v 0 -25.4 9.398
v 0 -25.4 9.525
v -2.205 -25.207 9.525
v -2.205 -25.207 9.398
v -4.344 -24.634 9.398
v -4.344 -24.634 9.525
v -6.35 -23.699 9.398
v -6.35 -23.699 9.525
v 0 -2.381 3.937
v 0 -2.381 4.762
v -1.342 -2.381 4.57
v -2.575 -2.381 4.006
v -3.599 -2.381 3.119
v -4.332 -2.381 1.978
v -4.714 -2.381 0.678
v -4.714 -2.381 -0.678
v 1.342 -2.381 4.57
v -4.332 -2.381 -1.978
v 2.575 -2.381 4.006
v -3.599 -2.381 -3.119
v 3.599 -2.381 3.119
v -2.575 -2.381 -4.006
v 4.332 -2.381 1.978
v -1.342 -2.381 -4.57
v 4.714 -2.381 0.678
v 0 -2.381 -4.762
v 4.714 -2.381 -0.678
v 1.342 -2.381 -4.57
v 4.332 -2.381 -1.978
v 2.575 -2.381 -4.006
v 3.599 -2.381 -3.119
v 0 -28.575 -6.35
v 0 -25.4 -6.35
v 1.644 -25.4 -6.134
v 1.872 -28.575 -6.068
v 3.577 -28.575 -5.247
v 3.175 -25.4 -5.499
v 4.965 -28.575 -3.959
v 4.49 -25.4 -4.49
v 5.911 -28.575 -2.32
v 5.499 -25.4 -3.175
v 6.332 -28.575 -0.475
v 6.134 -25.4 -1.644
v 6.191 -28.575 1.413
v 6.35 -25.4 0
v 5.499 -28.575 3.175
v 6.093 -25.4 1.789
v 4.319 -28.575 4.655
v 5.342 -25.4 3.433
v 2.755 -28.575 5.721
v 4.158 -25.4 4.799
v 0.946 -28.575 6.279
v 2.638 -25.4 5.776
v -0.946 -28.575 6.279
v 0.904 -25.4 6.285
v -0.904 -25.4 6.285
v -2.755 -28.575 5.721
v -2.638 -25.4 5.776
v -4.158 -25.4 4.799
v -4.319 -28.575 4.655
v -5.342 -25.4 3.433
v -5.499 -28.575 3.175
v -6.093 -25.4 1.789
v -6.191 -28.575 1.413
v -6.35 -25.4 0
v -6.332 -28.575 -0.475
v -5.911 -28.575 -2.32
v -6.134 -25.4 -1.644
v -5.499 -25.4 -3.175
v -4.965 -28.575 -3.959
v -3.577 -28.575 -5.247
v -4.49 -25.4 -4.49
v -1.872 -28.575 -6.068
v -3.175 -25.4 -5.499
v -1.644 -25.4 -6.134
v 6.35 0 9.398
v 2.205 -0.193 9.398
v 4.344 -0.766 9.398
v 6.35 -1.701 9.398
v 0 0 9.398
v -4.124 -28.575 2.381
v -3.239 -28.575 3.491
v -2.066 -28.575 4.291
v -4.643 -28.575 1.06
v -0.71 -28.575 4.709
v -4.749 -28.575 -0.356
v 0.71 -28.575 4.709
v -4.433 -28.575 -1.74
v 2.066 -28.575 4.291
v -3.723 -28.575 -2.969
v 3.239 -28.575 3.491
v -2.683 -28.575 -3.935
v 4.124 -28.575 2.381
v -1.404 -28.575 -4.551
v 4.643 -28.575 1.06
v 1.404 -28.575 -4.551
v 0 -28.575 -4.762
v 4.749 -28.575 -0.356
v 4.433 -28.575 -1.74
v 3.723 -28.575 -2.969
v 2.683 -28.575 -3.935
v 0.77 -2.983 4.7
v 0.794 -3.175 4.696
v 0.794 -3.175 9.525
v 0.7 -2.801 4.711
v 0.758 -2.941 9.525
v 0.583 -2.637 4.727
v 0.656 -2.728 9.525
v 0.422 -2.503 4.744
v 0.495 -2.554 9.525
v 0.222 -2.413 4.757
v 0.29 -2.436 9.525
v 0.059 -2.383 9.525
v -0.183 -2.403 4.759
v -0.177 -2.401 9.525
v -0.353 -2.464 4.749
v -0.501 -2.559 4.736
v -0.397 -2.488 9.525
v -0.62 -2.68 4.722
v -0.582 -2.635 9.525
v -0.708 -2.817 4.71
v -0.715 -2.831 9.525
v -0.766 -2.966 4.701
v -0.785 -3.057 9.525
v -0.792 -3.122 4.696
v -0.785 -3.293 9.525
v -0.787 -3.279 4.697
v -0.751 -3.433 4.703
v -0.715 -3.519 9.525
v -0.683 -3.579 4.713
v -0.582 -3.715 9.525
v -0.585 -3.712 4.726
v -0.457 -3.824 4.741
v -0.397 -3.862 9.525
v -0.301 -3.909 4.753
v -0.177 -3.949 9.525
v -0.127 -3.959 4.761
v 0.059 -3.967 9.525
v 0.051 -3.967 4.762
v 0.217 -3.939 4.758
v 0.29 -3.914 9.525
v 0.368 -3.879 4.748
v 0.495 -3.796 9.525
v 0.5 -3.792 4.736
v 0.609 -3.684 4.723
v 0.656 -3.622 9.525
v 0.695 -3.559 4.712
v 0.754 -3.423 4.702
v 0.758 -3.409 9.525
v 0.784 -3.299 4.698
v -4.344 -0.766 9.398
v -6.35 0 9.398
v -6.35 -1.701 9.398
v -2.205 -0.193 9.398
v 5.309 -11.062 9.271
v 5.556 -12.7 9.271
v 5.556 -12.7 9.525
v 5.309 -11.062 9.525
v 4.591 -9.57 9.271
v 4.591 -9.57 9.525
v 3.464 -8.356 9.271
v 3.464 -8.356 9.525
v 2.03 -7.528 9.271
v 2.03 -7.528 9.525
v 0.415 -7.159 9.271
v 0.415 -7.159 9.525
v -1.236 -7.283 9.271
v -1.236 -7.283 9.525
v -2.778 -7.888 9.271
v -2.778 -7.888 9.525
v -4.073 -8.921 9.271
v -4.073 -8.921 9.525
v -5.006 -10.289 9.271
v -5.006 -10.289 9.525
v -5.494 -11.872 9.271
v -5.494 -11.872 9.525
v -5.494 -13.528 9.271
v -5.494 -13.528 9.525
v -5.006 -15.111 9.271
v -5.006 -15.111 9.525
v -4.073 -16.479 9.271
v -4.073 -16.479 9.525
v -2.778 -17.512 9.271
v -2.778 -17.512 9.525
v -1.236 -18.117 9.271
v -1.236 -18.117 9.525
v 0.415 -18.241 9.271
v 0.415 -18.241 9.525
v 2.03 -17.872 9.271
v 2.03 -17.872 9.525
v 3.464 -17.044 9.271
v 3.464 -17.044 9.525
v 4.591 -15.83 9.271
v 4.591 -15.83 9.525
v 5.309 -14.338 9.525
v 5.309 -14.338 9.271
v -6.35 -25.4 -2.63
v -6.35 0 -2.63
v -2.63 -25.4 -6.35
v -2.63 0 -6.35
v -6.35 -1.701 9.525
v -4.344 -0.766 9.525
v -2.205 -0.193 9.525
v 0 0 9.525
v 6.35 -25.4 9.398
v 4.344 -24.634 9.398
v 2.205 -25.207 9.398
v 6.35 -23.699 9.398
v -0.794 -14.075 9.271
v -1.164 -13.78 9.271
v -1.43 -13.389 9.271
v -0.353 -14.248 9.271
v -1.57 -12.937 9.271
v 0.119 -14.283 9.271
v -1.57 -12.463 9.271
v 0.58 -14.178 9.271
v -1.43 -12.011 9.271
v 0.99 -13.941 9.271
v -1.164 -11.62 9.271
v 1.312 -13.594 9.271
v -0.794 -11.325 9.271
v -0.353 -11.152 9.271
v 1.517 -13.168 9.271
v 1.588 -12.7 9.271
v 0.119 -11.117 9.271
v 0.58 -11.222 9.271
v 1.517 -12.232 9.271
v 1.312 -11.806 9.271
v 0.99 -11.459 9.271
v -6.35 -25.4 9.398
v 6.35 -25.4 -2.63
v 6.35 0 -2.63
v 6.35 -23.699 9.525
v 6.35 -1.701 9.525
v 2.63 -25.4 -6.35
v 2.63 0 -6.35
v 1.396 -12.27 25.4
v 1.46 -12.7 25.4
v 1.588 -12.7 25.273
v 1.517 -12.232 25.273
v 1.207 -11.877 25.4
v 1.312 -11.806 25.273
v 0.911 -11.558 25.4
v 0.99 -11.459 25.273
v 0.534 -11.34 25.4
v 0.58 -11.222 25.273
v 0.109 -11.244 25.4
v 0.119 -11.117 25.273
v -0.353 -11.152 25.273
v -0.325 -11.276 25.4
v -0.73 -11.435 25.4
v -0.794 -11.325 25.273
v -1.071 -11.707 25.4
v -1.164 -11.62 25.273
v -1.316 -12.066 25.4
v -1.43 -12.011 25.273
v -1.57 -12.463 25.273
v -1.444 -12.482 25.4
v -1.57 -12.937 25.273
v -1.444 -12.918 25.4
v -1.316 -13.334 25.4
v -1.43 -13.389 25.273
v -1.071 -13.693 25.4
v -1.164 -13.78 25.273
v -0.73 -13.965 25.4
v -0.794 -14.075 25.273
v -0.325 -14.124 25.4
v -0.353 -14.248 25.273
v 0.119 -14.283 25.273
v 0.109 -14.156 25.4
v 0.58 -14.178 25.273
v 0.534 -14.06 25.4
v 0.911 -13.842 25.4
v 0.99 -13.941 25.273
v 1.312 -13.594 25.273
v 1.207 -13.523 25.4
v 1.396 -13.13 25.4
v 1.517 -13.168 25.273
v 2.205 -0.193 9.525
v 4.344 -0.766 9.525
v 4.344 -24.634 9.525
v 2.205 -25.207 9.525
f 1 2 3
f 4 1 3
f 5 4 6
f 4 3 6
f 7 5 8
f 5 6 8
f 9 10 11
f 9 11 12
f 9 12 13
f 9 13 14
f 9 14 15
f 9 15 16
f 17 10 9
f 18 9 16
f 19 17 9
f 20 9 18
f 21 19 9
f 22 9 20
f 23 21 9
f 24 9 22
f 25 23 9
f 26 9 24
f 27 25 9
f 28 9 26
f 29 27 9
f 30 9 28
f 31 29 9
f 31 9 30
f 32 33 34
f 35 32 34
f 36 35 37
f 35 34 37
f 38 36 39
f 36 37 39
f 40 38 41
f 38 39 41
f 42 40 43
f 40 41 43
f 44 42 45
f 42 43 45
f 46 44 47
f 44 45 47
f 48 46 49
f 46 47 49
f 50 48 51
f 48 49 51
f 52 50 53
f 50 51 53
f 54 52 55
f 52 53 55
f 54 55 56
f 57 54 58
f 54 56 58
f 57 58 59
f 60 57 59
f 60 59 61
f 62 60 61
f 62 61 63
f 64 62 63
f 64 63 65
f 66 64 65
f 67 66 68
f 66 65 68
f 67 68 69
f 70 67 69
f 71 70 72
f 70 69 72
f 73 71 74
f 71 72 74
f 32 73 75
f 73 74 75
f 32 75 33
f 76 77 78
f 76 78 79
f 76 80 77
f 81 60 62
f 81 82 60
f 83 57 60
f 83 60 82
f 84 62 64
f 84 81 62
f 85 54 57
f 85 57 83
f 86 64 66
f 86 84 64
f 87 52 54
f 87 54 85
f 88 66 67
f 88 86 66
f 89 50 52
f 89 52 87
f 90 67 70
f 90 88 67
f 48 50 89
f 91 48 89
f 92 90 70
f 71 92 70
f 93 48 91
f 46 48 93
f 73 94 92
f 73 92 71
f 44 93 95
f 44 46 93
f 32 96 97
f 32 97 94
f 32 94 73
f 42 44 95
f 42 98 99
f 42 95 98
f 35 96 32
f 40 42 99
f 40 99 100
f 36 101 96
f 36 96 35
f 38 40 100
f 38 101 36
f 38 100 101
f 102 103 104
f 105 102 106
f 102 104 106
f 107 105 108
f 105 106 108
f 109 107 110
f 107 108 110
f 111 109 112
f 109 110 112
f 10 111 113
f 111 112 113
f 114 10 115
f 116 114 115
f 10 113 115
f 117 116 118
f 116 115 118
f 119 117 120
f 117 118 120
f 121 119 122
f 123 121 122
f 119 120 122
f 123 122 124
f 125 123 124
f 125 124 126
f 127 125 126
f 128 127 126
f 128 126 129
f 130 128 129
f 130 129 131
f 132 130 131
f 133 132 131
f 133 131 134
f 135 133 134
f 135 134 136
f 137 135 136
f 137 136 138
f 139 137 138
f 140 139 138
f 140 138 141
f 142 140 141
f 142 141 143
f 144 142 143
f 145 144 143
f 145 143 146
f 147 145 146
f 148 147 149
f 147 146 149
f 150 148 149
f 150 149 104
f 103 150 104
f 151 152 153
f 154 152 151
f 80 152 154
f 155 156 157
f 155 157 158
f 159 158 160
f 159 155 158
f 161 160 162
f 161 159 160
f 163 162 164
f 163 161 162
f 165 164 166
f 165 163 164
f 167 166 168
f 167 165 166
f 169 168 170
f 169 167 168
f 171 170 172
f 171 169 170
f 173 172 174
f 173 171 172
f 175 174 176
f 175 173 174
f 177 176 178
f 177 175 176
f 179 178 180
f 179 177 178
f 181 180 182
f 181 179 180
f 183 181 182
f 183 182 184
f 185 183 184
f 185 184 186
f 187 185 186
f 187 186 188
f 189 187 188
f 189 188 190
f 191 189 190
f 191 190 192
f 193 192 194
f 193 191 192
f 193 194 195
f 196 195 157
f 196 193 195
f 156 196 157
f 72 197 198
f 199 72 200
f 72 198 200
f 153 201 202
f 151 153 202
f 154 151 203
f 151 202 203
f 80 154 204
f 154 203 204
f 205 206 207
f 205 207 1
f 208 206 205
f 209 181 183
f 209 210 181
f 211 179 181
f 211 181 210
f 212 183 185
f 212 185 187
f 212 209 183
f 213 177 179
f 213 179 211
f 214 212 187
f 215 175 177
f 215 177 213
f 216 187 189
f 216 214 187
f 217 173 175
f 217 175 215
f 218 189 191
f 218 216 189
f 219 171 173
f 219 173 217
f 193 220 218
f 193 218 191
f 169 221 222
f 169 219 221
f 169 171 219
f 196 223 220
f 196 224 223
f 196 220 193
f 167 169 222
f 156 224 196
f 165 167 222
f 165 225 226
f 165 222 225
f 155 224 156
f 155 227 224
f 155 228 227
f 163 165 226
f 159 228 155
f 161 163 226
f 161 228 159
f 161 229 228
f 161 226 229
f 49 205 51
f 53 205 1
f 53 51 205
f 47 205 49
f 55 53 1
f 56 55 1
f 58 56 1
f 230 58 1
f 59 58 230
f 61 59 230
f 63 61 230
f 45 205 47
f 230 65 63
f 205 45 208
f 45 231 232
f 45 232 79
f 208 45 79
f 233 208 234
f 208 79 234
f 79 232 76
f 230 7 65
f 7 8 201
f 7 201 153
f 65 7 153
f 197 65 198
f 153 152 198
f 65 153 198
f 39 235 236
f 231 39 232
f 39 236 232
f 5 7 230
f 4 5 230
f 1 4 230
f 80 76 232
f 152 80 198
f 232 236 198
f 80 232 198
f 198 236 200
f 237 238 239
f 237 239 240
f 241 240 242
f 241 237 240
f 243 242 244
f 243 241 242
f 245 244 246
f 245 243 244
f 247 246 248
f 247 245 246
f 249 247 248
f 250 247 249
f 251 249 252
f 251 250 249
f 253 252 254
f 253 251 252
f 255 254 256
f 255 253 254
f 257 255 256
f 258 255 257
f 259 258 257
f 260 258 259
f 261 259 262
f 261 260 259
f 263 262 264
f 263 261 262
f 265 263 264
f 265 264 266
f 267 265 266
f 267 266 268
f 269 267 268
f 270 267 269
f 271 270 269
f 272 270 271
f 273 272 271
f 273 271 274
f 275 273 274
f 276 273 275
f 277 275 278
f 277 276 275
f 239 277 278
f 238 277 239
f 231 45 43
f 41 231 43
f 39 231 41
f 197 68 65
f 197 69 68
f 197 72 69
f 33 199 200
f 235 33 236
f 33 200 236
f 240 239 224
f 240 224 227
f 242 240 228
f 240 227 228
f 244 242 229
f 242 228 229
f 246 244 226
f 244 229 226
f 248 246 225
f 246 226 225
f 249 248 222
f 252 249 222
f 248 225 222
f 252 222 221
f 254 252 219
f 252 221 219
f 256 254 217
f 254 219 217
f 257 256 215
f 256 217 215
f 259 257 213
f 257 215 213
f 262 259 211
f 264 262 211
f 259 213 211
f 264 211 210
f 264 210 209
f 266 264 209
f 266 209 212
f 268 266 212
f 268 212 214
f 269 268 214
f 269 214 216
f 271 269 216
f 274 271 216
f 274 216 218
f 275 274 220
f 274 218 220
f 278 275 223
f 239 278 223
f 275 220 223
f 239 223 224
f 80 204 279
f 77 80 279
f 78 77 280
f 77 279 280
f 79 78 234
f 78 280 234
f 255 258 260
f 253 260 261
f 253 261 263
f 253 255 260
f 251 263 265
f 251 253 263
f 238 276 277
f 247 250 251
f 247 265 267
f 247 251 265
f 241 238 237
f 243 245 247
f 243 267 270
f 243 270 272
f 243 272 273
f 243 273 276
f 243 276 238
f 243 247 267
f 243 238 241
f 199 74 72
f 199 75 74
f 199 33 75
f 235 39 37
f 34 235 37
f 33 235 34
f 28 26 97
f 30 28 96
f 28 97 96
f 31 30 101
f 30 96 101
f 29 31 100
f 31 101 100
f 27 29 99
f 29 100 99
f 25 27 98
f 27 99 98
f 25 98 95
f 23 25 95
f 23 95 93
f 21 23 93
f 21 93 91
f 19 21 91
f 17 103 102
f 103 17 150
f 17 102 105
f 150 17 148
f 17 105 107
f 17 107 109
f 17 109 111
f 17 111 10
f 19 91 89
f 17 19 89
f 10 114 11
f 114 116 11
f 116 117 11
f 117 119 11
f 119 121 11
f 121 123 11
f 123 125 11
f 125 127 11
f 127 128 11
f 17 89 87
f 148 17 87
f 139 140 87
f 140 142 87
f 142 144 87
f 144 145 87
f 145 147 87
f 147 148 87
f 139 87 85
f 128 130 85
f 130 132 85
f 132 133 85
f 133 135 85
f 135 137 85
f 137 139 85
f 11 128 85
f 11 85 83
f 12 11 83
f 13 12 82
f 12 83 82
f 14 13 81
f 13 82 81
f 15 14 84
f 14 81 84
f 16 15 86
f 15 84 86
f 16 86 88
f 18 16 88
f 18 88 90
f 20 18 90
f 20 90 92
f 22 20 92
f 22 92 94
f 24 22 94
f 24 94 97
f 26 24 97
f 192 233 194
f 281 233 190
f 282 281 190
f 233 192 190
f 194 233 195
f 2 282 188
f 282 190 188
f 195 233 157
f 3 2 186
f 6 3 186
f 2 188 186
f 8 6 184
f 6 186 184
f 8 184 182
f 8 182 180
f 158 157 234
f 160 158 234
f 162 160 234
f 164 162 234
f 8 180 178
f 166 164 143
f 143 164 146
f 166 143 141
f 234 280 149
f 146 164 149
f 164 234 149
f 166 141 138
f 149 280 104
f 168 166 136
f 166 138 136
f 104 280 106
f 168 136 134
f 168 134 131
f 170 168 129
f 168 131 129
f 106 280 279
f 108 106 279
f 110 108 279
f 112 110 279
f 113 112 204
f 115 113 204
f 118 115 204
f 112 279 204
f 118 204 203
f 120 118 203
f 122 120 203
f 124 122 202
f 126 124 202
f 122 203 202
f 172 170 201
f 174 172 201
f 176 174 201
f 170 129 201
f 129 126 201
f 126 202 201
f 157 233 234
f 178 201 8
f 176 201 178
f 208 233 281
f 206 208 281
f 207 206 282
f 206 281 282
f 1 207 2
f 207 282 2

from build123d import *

# Parameters (mm, degrees)
BOSS_EXTRUDE2_DEPTH = 25.4
SKETCH2_R           = 6.35
BOSS_EXTRUDE3_DEPTH = 3.175
SKETCH3_R           = 4.7625
CUT_EXTRUDE1_DEPTH  = 26.19375
SKETCH4_R           = 1.5875
BOSS_EXTRUDE4_DEPTH = 15.875
CUT_EXTRUDE2_START  = -0.254
SKETCH5_R           = 5.55625
SKETCH5_R_2         = 1.5875
CUT_EXTRUDE2_DEPTH  = 0.254
CUT_EXTRUDE4_DEPTH  = 0.127
SKETCH4_4_R         = 0.79375
CUT_EXTRUDE6_DEPTH  = 5.588
CHAMFER1_SIZE       = 0.127


with BuildPart() as part:
    # Sketch1 → Boss-Extrude2 (new body)
    with BuildSketch(Plane(origin=(0, 0, 0), x_dir=(1, 0, 0), z_dir=(0, 1, 0))):
        Polygon((6.35, -9.525), (-6.35, -9.525), (-6.35, 2.630256121), (-2.630256121, 6.35), (2.630256121, 6.35), (6.35, 2.630256121), align=None)
    extrude(amount=-BOSS_EXTRUDE2_DEPTH)

    # Sketch2 → Boss-Extrude3 (add)
    with BuildSketch(Plane.XZ.offset(25.4)):
        with Locations(Location((0, 0, 0), (0, 0, 270))):
            Circle(SKETCH2_R)
    extrude(amount=BOSS_EXTRUDE3_DEPTH)

    # Sketch3 → Cut-Extrude1 (cut)
    with BuildSketch(Plane.XZ.offset(28.575)):
        with Locations(Location((0, 0, 0), (0, 0, 270))):
            Circle(SKETCH3_R)
    extrude(amount=-CUT_EXTRUDE1_DEPTH, mode=Mode.SUBTRACT)

    # Sketch4 → Boss-Extrude4 (add)
    with BuildSketch(Plane.XY.offset(9.525)):
        with Locations((0, -12.7)):
            Circle(SKETCH4_R)
    extrude(amount=BOSS_EXTRUDE4_DEPTH)

    # Sketch5 → Cut-Extrude2 (cut)
    with BuildSketch(Plane.XY.offset(9.525).offset(CUT_EXTRUDE2_START)):
        with Locations((0, -12.7)):
            Circle(SKETCH5_R)
        with Locations((0, -12.7)):
            Circle(SKETCH5_R_2, mode=Mode.SUBTRACT)
    extrude(amount=CUT_EXTRUDE2_DEPTH, mode=Mode.SUBTRACT)

    # Sketch5<4> → Cut-Extrude4 (cut)
    with BuildSketch(Plane.XY.offset(9.525)):
        with BuildLine():
            ThreePointArc((0, 0), (3.287001873, -0.432742006), (6.35, -1.701477372))
            Line((6.35, -1.701477372), (6.35, 0))
            Line((6.35, 0), (0, 0))
        make_face()
        with BuildLine():
            ThreePointArc((-6.35, -1.701477372), (-3.287001873, -0.432742006), (0, 0))
            Line((0, 0), (-6.35, 0))
            Line((-6.35, 0), (-6.35, -1.701477372))
        make_face()
        with BuildLine():
            Line((-6.35, -25.4), (0, -25.4))
            ThreePointArc((0, -25.4), (-3.287001873, -24.967257994), (-6.35, -23.698522628))
            Line((-6.35, -23.698522628), (-6.35, -25.4))
        make_face()
        with BuildLine():
            Line((6.35, -25.4), (6.35, -23.698522628))
            ThreePointArc((6.35, -23.698522628), (3.287001873, -24.967257994), (0, -25.4))
            Line((0, -25.4), (6.35, -25.4))
        make_face()
    extrude(amount=-CUT_EXTRUDE4_DEPTH, mode=Mode.SUBTRACT)

    # Sketch4<4> → Cut-Extrude6 (cut)
    with BuildSketch(Plane.XY.offset(9.525)):
        with Locations((0, -3.175)):
            Circle(SKETCH4_4_R)
    extrude(amount=-CUT_EXTRUDE6_DEPTH, mode=Mode.SUBTRACT)

    # Chamfer1
    chamfer1_edges = [part.edges().sort_by_distance(p)[0] for p in [
        (-1.5875, -12.7, 25.4),
    ]]
    chamfer(chamfer1_edges, length=CHAMFER1_SIZE)


solid = part.part
